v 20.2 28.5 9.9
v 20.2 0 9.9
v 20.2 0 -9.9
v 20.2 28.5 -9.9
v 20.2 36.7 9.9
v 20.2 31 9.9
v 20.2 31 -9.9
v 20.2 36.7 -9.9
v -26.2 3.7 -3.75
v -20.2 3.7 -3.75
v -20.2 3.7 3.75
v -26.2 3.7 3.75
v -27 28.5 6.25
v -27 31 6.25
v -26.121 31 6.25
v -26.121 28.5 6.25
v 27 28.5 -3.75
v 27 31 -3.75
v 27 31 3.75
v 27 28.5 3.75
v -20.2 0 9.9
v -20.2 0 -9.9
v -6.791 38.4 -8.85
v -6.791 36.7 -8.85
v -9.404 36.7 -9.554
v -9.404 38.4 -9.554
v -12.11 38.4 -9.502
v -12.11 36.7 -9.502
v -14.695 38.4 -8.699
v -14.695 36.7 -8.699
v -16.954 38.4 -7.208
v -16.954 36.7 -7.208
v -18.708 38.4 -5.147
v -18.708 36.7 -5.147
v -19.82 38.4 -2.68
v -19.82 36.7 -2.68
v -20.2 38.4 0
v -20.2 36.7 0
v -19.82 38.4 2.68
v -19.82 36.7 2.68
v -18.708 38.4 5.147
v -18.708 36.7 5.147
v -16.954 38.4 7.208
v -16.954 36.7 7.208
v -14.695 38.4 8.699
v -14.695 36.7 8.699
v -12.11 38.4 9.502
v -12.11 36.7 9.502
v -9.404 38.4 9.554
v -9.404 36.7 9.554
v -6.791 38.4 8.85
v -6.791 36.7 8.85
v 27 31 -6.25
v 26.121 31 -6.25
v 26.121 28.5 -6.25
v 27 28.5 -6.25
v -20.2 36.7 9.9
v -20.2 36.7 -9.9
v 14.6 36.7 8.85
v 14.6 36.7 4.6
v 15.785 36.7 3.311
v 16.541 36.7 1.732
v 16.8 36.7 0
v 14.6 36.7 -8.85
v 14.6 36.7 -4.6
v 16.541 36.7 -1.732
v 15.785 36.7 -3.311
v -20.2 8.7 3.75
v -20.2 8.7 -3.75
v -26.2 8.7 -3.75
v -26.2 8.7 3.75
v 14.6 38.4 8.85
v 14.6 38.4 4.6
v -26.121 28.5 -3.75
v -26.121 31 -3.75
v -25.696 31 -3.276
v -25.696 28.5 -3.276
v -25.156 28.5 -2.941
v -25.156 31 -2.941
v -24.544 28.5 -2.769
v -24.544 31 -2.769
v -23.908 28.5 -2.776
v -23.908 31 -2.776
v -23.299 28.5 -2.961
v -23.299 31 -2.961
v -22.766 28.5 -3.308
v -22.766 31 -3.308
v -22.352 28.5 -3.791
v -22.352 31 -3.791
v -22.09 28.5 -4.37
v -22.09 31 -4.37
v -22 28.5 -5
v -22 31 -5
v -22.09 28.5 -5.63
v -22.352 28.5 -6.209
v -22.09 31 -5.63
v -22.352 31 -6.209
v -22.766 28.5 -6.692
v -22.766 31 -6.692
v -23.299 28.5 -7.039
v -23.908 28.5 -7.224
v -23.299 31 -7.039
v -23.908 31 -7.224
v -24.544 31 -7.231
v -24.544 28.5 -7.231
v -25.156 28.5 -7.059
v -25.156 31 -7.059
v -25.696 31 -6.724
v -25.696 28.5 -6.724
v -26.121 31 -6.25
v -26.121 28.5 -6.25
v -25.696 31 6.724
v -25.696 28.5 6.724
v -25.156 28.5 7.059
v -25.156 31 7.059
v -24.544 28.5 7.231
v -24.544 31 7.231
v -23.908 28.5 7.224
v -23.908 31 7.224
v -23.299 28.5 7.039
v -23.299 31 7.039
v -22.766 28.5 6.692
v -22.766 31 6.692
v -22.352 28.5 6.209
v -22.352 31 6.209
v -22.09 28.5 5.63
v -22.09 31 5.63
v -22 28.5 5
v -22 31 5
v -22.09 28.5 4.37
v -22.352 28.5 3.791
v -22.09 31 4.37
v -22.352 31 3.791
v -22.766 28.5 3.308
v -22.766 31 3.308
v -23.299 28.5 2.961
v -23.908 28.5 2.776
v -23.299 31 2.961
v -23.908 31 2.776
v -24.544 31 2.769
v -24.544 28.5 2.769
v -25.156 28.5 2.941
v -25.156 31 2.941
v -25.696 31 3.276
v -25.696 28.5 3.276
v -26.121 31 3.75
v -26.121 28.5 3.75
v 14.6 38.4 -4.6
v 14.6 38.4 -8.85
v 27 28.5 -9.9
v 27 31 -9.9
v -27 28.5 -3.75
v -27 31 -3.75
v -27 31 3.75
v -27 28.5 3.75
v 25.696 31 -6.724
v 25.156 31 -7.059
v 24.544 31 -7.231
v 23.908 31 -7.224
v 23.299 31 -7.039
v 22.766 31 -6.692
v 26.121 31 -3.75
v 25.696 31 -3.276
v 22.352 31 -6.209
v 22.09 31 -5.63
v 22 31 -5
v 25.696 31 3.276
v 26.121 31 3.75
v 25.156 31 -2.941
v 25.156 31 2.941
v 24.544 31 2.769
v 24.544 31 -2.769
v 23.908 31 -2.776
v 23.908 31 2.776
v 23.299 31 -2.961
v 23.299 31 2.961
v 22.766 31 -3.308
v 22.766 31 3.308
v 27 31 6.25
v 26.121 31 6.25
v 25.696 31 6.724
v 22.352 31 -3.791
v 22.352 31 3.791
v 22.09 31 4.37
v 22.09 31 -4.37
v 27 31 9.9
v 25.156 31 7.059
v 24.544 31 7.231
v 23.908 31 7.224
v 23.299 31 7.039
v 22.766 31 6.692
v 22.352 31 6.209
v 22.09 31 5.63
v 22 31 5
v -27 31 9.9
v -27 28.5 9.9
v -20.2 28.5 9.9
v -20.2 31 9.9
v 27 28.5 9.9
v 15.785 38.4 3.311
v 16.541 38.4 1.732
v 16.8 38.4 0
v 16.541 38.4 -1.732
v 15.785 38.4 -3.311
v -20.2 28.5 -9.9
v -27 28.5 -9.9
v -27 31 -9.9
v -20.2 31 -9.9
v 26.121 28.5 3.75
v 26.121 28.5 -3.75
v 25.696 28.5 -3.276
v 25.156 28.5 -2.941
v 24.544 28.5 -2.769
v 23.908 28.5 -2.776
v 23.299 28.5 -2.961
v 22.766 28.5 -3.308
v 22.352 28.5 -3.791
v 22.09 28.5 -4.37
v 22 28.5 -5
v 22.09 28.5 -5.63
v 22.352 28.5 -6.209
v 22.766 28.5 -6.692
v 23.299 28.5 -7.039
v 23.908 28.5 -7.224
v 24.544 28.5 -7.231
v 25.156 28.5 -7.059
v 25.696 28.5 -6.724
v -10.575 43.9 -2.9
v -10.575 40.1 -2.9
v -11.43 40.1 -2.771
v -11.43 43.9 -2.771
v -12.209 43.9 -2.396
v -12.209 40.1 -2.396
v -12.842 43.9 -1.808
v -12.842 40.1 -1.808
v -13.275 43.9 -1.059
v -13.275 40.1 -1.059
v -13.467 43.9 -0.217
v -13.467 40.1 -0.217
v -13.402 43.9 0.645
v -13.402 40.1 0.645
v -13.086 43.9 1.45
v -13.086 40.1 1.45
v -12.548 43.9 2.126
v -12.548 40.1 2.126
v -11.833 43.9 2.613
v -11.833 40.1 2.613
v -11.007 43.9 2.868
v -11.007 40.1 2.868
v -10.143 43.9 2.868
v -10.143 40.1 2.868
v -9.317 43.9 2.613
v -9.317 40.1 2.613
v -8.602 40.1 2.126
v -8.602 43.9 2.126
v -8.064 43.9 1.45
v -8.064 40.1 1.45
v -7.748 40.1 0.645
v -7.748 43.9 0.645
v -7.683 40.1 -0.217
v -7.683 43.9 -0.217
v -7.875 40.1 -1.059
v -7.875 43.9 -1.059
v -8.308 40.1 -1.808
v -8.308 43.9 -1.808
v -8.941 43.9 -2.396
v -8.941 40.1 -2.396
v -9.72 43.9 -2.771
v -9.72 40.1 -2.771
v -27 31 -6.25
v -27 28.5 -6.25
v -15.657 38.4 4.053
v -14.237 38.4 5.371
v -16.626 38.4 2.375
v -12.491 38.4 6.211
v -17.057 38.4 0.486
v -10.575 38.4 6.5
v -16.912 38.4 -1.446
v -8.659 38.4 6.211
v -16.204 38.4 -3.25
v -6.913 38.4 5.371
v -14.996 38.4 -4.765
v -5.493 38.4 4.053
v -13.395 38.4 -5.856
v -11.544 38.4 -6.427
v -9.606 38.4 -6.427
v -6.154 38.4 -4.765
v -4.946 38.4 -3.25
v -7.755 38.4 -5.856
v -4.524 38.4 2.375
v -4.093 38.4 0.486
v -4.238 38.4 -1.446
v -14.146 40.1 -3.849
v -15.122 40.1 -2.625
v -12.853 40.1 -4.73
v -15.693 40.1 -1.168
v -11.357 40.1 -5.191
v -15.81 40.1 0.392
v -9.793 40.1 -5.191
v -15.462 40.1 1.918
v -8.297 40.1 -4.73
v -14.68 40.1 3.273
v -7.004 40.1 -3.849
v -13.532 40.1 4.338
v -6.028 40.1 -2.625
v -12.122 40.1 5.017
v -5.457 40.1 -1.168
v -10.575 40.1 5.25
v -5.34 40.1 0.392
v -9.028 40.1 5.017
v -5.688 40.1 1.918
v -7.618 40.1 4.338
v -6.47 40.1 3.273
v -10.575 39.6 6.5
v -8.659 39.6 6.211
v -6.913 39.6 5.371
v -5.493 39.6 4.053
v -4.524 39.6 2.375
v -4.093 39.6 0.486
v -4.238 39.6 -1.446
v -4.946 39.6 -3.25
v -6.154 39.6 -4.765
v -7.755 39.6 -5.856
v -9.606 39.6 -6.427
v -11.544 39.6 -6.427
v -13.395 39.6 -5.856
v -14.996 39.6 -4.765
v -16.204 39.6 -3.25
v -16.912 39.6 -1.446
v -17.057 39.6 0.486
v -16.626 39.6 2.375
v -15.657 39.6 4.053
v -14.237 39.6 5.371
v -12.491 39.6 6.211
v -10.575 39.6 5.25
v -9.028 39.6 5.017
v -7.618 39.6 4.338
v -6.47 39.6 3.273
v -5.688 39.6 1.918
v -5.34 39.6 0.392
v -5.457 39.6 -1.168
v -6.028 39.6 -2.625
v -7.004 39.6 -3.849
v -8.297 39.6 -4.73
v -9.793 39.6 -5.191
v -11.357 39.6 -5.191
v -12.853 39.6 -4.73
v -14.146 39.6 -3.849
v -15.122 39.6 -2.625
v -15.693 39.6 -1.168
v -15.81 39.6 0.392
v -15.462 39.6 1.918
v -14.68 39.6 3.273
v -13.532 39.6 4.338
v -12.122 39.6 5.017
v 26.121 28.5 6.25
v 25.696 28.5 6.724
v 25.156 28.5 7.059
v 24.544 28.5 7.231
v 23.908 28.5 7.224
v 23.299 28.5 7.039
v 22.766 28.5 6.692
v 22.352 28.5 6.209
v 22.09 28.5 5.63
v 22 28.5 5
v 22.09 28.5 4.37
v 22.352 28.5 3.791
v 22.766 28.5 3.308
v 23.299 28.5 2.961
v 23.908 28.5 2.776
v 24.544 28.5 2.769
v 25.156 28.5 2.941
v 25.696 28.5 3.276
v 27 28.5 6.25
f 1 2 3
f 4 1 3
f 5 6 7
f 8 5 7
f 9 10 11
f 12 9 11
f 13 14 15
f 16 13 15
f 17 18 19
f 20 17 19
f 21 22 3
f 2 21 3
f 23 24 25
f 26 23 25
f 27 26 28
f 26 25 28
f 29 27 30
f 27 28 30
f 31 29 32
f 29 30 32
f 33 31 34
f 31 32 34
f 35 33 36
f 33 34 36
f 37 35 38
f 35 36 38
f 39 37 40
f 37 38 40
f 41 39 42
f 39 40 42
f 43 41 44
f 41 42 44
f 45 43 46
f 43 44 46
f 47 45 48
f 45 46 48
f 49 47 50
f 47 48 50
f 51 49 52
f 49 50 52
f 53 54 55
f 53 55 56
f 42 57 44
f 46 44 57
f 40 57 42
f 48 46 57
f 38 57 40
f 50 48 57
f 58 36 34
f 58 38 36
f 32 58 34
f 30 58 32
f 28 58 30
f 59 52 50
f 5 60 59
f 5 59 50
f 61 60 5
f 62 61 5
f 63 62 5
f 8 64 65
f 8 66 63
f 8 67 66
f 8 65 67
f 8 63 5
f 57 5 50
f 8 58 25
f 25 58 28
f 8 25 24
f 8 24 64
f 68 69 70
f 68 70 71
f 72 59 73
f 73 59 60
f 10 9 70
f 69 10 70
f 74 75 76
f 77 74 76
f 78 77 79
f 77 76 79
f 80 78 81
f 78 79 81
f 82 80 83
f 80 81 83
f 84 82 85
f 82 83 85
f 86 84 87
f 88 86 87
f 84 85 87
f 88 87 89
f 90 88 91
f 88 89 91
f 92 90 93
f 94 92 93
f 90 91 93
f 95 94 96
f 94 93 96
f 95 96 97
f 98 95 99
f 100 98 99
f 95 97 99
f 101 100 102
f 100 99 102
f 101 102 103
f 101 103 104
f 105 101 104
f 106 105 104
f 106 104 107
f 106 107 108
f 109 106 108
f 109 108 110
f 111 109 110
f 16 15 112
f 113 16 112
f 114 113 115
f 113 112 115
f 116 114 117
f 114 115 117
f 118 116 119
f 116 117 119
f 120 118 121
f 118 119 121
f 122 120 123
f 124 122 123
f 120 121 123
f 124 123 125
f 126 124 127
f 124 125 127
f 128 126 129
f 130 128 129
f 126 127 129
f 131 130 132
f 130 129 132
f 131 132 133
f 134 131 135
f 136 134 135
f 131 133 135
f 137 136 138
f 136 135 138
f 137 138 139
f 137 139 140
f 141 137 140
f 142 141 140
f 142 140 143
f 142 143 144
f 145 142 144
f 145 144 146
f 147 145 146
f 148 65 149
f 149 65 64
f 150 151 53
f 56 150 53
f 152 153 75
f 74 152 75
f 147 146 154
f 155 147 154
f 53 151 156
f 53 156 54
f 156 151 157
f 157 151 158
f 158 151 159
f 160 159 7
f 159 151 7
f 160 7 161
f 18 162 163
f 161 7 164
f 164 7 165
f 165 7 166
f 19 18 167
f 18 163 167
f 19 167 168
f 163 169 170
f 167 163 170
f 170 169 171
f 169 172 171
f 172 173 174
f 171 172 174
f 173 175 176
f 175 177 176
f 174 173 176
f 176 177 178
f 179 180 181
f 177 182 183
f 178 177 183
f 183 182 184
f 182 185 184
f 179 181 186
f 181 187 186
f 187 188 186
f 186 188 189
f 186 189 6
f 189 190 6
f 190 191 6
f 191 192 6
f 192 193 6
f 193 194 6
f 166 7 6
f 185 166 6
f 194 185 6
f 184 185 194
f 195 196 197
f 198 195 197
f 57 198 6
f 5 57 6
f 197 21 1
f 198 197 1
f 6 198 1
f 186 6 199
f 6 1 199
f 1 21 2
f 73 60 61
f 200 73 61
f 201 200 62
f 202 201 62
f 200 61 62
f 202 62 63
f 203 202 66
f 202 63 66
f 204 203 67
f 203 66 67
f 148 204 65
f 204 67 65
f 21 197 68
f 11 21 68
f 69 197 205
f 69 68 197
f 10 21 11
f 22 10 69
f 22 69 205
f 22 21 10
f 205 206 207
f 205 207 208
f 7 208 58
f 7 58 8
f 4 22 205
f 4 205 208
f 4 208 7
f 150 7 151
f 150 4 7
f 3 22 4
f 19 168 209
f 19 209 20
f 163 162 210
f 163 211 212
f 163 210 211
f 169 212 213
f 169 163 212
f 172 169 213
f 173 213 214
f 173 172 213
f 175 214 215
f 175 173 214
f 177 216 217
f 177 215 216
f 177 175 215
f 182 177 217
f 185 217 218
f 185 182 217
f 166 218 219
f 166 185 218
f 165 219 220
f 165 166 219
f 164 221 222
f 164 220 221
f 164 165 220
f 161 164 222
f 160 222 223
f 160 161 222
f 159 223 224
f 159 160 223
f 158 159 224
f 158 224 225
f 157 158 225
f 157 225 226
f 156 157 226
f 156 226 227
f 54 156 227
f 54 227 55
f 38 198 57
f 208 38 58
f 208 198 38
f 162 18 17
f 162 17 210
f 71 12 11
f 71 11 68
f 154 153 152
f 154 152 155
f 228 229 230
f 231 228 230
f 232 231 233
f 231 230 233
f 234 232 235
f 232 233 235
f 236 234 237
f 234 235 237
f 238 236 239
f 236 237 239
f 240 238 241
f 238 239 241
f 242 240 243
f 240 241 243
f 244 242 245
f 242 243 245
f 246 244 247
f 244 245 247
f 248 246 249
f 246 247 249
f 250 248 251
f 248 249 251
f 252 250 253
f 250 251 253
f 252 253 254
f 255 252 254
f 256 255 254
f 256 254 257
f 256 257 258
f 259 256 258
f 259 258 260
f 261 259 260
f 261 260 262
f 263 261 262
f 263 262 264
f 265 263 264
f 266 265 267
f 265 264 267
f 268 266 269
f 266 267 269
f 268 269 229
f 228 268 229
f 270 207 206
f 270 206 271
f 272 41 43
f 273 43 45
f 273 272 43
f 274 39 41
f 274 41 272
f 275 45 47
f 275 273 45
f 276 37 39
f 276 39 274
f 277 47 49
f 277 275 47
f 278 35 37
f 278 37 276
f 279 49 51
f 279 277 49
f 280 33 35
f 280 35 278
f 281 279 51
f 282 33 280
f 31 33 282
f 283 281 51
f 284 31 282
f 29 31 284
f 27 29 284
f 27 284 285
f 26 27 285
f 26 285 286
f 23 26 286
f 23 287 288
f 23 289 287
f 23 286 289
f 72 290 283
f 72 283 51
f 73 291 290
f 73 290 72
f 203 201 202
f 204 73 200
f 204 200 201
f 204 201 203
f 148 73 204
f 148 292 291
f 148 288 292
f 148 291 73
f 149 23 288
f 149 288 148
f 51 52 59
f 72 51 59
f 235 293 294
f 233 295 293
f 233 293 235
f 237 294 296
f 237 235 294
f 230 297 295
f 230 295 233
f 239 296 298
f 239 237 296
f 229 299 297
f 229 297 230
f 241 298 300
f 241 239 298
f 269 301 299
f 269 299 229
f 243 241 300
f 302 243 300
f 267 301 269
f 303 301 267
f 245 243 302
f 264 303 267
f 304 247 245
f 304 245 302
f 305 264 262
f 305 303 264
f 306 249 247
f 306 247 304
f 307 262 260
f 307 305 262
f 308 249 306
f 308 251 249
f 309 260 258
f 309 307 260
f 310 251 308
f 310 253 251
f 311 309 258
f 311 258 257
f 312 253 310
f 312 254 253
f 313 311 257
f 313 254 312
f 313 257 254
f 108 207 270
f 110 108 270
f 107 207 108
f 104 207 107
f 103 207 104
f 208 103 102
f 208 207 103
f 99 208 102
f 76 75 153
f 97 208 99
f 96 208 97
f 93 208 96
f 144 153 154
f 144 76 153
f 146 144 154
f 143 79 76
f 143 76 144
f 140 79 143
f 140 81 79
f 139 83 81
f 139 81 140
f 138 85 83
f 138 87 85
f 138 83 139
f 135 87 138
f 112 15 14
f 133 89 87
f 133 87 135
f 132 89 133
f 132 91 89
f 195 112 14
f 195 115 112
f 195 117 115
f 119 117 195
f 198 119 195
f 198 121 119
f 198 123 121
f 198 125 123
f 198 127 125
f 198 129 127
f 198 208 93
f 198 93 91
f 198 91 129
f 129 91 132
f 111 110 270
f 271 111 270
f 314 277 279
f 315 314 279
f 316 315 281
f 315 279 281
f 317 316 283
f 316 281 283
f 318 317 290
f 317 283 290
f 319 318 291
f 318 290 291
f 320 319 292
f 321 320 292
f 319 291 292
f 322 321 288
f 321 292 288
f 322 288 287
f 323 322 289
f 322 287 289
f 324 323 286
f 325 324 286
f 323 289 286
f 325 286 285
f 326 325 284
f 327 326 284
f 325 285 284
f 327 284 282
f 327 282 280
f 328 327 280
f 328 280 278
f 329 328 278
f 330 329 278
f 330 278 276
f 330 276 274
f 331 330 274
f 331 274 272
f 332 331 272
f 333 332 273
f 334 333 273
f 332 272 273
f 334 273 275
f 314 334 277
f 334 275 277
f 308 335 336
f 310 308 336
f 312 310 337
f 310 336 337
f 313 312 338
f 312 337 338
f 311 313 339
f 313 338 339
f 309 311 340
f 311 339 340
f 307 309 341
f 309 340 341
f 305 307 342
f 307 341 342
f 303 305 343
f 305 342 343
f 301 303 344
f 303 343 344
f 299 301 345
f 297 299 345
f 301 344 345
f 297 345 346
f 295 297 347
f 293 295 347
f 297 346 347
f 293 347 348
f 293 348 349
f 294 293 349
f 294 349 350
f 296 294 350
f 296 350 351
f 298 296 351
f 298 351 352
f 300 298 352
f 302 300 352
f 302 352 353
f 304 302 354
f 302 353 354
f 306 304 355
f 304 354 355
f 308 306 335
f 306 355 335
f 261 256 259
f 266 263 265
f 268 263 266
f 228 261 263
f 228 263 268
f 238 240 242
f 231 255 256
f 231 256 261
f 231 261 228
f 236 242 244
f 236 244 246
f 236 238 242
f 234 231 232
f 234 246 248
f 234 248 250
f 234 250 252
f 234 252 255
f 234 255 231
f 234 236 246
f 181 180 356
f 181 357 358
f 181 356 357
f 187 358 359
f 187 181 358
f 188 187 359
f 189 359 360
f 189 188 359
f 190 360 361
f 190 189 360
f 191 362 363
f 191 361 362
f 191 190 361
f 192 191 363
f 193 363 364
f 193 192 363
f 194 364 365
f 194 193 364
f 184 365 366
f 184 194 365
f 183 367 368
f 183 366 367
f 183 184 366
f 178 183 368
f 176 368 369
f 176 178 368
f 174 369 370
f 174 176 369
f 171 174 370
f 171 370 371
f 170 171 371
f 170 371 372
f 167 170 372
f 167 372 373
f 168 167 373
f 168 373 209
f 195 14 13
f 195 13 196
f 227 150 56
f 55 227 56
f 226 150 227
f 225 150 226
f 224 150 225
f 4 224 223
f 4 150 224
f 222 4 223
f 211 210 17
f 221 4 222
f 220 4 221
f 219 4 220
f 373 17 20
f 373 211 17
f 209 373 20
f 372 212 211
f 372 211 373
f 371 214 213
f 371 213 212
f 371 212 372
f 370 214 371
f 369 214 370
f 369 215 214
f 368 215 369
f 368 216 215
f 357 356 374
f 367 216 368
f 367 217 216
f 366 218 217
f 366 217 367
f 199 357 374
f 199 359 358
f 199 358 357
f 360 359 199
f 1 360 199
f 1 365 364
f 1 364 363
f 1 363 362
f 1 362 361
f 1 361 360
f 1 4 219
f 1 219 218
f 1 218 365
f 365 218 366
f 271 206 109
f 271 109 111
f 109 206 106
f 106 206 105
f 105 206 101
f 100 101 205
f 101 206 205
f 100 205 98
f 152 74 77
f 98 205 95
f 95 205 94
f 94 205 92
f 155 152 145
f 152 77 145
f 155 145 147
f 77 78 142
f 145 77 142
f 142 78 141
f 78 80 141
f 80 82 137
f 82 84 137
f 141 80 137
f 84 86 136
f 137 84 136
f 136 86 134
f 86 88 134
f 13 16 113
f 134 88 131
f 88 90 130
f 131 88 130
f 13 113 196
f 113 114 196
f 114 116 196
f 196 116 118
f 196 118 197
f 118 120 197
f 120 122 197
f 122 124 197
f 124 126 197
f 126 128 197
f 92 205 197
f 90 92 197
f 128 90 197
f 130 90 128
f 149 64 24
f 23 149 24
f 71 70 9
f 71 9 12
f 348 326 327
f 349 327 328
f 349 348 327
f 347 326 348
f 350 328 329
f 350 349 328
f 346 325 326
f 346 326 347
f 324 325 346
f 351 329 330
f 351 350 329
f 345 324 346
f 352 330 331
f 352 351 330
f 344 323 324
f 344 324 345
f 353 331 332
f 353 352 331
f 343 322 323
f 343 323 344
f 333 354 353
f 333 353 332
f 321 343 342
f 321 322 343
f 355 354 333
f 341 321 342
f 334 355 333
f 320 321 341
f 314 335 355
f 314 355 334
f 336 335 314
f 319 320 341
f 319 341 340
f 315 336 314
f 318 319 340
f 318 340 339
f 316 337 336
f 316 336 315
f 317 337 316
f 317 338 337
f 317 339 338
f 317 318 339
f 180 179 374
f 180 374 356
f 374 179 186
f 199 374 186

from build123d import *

# Parameters (mm, degrees)
SKETCH1_W           = 40.4
SKETCH1_H           = 19.8
BOSS_EXTRUDE1_DEPTH = 36.7
SKETCH2_R           = 9.625
BOSS_EXTRUDE2_DEPTH = 1.7
SKETCH3_R           = 6.5
BOSS_EXTRUDE3_DEPTH = 1.2
SKETCH4_R           = 5.25
BOSS_EXTRUDE4_DEPTH = 0.5
SKETCH5_R           = 2.9
BOSS_EXTRUDE5_DEPTH = 3.8
SKETCH6_W           = 19.8
SKETCH6_H           = 2.5
BOSS_EXTRUDE6_DEPTH = 6.8
SKETCH7_R           = 2.25
CUT_EXTRUDE1_DEPTH  = 6.8
SKETCH8_W           = 7.5
SKETCH8_H           = 5
BOSS_EXTRUDE7_DEPTH = 6


with BuildPart() as part:
    # Sketch1 → Boss-Extrude1 (new body)
    with BuildSketch(Plane(origin=(0, 0, 0), x_dir=(1, 0, 0), z_dir=(0, 1, 0))):
        Rectangle(SKETCH1_W, SKETCH1_H)
    extrude(amount=BOSS_EXTRUDE1_DEPTH)

    # Sketch2 → Boss-Extrude2 (add)
    with BuildSketch(Plane(origin=(0, 36.7, 0), x_dir=(1, 0, 0), z_dir=(0, 1, 0))):
        with Locations((-10.575, 0)):
            Circle(SKETCH2_R)
        with BuildLine():
            ThreePointArc((-0.95, 0), (-2.541913742, -5.301900618), (-6.791070164, -8.85))
            Line((-6.791070164, -8.85), (14.6, -8.85))
            Line((14.6, -8.85), (14.6, -4.6))
            Line((14.6, -4.6), (14.6, 4.6))
            Line((14.6, 4.6), (14.6, 8.85))
            Line((14.6, 8.85), (-6.791070164, 8.85))
            ThreePointArc((-6.791070164, 8.85), (-2.541913742, 5.301900618), (-0.95, 0))
        make_face()
        with BuildLine():
            Line((14.6, 4.6), (14.6, -4.6))
            ThreePointArc((14.6, -4.6), (16.8, 0), (14.6, 4.6))
        make_face()
    extrude(amount=BOSS_EXTRUDE2_DEPTH)

    # Sketch3 → Boss-Extrude3 (add)
    with BuildSketch(Plane(origin=(0, 38.4, 0), x_dir=(1, 0, 0), z_dir=(0, 1, 0))):
        with Locations(Location((-10.575, 0, 0), (0, 0, 270))):
            Circle(SKETCH3_R)
    extrude(amount=BOSS_EXTRUDE3_DEPTH)

    # Sketch4 → Boss-Extrude4 (add)
    with BuildSketch(Plane(origin=(0, 39.6, 0), x_dir=(1, 0, 0), z_dir=(0, 1, 0))):
        with Locations(Location((-10.575, 0, 0), (0, 0, 270))):
            Circle(SKETCH4_R)
    extrude(amount=BOSS_EXTRUDE4_DEPTH)

    # Sketch5 → Boss-Extrude5 (add)
    with BuildSketch(Plane(origin=(0, 40.1, 0), x_dir=(1, 0, 0), z_dir=(0, 1, 0))):
        with Locations(Location((-10.575, 0, 0), (0, 0, 90))):
            Circle(SKETCH5_R)
    extrude(amount=BOSS_EXTRUDE5_DEPTH)

    # Sketch6 → Boss-Extrude6 (add)
    with BuildSketch(Plane.ZY.offset(20.2)):
        with Locations((0, 29.75)):
            Rectangle(SKETCH6_W, SKETCH6_H)
    boss_extrude6 = extrude(amount=BOSS_EXTRUDE6_DEPTH)

    # Sketch7 → Cut-Extrude1 (cut)
    with BuildSketch(Plane(origin=(0, 31, 0), x_dir=(1, 0, 0), z_dir=(0, 1, 0))):
        with Locations((-24.25, 5)):
            Circle(SKETCH7_R)
        with BuildLine():
            Line((-27, 6.25), (-27, 3.75))
            Line((-27, 3.75), (-26.120828693, 3.75))
            ThreePointArc((-26.120828693, 3.75), (-26.5, 5), (-26.120828693, 6.25))
            Line((-26.120828693, 6.25), (-27, 6.25))
        make_face()
        with Locations((-24.25, -5)):
            Circle(SKETCH7_R)
        with BuildLine():
            Line((-27, -3.75), (-27, -6.25))
            Line((-27, -6.25), (-26.120828693, -6.25))
            ThreePointArc((-26.120828693, -6.25), (-26.5, -5), (-26.120828693, -3.75))
            Line((-26.120828693, -3.75), (-27, -3.75))
        make_face()
    cut_extrude1 = extrude(amount=-CUT_EXTRUDE1_DEPTH, mode=Mode.SUBTRACT)

    # Mirror1: Boss-Extrude6, Cut-Extrude1 across plane
    add(boss_extrude6.mirror(Plane(origin=(0, 0, 0), x_dir=(0, 0, 1), z_dir=(1, 0, 0))))
    add(cut_extrude1.mirror(Plane(origin=(0, 0, 0), x_dir=(0, 0, 1), z_dir=(1, 0, 0))), mode=Mode.SUBTRACT)

    # Sketch8 → Boss-Extrude7 (add)
    with BuildSketch(Plane.ZY.offset(20.2)):
        with Locations((0, 6.2)):
            Rectangle(SKETCH8_W, SKETCH8_H)
    extrude(amount=BOSS_EXTRUDE7_DEPTH)


solid = part.part
